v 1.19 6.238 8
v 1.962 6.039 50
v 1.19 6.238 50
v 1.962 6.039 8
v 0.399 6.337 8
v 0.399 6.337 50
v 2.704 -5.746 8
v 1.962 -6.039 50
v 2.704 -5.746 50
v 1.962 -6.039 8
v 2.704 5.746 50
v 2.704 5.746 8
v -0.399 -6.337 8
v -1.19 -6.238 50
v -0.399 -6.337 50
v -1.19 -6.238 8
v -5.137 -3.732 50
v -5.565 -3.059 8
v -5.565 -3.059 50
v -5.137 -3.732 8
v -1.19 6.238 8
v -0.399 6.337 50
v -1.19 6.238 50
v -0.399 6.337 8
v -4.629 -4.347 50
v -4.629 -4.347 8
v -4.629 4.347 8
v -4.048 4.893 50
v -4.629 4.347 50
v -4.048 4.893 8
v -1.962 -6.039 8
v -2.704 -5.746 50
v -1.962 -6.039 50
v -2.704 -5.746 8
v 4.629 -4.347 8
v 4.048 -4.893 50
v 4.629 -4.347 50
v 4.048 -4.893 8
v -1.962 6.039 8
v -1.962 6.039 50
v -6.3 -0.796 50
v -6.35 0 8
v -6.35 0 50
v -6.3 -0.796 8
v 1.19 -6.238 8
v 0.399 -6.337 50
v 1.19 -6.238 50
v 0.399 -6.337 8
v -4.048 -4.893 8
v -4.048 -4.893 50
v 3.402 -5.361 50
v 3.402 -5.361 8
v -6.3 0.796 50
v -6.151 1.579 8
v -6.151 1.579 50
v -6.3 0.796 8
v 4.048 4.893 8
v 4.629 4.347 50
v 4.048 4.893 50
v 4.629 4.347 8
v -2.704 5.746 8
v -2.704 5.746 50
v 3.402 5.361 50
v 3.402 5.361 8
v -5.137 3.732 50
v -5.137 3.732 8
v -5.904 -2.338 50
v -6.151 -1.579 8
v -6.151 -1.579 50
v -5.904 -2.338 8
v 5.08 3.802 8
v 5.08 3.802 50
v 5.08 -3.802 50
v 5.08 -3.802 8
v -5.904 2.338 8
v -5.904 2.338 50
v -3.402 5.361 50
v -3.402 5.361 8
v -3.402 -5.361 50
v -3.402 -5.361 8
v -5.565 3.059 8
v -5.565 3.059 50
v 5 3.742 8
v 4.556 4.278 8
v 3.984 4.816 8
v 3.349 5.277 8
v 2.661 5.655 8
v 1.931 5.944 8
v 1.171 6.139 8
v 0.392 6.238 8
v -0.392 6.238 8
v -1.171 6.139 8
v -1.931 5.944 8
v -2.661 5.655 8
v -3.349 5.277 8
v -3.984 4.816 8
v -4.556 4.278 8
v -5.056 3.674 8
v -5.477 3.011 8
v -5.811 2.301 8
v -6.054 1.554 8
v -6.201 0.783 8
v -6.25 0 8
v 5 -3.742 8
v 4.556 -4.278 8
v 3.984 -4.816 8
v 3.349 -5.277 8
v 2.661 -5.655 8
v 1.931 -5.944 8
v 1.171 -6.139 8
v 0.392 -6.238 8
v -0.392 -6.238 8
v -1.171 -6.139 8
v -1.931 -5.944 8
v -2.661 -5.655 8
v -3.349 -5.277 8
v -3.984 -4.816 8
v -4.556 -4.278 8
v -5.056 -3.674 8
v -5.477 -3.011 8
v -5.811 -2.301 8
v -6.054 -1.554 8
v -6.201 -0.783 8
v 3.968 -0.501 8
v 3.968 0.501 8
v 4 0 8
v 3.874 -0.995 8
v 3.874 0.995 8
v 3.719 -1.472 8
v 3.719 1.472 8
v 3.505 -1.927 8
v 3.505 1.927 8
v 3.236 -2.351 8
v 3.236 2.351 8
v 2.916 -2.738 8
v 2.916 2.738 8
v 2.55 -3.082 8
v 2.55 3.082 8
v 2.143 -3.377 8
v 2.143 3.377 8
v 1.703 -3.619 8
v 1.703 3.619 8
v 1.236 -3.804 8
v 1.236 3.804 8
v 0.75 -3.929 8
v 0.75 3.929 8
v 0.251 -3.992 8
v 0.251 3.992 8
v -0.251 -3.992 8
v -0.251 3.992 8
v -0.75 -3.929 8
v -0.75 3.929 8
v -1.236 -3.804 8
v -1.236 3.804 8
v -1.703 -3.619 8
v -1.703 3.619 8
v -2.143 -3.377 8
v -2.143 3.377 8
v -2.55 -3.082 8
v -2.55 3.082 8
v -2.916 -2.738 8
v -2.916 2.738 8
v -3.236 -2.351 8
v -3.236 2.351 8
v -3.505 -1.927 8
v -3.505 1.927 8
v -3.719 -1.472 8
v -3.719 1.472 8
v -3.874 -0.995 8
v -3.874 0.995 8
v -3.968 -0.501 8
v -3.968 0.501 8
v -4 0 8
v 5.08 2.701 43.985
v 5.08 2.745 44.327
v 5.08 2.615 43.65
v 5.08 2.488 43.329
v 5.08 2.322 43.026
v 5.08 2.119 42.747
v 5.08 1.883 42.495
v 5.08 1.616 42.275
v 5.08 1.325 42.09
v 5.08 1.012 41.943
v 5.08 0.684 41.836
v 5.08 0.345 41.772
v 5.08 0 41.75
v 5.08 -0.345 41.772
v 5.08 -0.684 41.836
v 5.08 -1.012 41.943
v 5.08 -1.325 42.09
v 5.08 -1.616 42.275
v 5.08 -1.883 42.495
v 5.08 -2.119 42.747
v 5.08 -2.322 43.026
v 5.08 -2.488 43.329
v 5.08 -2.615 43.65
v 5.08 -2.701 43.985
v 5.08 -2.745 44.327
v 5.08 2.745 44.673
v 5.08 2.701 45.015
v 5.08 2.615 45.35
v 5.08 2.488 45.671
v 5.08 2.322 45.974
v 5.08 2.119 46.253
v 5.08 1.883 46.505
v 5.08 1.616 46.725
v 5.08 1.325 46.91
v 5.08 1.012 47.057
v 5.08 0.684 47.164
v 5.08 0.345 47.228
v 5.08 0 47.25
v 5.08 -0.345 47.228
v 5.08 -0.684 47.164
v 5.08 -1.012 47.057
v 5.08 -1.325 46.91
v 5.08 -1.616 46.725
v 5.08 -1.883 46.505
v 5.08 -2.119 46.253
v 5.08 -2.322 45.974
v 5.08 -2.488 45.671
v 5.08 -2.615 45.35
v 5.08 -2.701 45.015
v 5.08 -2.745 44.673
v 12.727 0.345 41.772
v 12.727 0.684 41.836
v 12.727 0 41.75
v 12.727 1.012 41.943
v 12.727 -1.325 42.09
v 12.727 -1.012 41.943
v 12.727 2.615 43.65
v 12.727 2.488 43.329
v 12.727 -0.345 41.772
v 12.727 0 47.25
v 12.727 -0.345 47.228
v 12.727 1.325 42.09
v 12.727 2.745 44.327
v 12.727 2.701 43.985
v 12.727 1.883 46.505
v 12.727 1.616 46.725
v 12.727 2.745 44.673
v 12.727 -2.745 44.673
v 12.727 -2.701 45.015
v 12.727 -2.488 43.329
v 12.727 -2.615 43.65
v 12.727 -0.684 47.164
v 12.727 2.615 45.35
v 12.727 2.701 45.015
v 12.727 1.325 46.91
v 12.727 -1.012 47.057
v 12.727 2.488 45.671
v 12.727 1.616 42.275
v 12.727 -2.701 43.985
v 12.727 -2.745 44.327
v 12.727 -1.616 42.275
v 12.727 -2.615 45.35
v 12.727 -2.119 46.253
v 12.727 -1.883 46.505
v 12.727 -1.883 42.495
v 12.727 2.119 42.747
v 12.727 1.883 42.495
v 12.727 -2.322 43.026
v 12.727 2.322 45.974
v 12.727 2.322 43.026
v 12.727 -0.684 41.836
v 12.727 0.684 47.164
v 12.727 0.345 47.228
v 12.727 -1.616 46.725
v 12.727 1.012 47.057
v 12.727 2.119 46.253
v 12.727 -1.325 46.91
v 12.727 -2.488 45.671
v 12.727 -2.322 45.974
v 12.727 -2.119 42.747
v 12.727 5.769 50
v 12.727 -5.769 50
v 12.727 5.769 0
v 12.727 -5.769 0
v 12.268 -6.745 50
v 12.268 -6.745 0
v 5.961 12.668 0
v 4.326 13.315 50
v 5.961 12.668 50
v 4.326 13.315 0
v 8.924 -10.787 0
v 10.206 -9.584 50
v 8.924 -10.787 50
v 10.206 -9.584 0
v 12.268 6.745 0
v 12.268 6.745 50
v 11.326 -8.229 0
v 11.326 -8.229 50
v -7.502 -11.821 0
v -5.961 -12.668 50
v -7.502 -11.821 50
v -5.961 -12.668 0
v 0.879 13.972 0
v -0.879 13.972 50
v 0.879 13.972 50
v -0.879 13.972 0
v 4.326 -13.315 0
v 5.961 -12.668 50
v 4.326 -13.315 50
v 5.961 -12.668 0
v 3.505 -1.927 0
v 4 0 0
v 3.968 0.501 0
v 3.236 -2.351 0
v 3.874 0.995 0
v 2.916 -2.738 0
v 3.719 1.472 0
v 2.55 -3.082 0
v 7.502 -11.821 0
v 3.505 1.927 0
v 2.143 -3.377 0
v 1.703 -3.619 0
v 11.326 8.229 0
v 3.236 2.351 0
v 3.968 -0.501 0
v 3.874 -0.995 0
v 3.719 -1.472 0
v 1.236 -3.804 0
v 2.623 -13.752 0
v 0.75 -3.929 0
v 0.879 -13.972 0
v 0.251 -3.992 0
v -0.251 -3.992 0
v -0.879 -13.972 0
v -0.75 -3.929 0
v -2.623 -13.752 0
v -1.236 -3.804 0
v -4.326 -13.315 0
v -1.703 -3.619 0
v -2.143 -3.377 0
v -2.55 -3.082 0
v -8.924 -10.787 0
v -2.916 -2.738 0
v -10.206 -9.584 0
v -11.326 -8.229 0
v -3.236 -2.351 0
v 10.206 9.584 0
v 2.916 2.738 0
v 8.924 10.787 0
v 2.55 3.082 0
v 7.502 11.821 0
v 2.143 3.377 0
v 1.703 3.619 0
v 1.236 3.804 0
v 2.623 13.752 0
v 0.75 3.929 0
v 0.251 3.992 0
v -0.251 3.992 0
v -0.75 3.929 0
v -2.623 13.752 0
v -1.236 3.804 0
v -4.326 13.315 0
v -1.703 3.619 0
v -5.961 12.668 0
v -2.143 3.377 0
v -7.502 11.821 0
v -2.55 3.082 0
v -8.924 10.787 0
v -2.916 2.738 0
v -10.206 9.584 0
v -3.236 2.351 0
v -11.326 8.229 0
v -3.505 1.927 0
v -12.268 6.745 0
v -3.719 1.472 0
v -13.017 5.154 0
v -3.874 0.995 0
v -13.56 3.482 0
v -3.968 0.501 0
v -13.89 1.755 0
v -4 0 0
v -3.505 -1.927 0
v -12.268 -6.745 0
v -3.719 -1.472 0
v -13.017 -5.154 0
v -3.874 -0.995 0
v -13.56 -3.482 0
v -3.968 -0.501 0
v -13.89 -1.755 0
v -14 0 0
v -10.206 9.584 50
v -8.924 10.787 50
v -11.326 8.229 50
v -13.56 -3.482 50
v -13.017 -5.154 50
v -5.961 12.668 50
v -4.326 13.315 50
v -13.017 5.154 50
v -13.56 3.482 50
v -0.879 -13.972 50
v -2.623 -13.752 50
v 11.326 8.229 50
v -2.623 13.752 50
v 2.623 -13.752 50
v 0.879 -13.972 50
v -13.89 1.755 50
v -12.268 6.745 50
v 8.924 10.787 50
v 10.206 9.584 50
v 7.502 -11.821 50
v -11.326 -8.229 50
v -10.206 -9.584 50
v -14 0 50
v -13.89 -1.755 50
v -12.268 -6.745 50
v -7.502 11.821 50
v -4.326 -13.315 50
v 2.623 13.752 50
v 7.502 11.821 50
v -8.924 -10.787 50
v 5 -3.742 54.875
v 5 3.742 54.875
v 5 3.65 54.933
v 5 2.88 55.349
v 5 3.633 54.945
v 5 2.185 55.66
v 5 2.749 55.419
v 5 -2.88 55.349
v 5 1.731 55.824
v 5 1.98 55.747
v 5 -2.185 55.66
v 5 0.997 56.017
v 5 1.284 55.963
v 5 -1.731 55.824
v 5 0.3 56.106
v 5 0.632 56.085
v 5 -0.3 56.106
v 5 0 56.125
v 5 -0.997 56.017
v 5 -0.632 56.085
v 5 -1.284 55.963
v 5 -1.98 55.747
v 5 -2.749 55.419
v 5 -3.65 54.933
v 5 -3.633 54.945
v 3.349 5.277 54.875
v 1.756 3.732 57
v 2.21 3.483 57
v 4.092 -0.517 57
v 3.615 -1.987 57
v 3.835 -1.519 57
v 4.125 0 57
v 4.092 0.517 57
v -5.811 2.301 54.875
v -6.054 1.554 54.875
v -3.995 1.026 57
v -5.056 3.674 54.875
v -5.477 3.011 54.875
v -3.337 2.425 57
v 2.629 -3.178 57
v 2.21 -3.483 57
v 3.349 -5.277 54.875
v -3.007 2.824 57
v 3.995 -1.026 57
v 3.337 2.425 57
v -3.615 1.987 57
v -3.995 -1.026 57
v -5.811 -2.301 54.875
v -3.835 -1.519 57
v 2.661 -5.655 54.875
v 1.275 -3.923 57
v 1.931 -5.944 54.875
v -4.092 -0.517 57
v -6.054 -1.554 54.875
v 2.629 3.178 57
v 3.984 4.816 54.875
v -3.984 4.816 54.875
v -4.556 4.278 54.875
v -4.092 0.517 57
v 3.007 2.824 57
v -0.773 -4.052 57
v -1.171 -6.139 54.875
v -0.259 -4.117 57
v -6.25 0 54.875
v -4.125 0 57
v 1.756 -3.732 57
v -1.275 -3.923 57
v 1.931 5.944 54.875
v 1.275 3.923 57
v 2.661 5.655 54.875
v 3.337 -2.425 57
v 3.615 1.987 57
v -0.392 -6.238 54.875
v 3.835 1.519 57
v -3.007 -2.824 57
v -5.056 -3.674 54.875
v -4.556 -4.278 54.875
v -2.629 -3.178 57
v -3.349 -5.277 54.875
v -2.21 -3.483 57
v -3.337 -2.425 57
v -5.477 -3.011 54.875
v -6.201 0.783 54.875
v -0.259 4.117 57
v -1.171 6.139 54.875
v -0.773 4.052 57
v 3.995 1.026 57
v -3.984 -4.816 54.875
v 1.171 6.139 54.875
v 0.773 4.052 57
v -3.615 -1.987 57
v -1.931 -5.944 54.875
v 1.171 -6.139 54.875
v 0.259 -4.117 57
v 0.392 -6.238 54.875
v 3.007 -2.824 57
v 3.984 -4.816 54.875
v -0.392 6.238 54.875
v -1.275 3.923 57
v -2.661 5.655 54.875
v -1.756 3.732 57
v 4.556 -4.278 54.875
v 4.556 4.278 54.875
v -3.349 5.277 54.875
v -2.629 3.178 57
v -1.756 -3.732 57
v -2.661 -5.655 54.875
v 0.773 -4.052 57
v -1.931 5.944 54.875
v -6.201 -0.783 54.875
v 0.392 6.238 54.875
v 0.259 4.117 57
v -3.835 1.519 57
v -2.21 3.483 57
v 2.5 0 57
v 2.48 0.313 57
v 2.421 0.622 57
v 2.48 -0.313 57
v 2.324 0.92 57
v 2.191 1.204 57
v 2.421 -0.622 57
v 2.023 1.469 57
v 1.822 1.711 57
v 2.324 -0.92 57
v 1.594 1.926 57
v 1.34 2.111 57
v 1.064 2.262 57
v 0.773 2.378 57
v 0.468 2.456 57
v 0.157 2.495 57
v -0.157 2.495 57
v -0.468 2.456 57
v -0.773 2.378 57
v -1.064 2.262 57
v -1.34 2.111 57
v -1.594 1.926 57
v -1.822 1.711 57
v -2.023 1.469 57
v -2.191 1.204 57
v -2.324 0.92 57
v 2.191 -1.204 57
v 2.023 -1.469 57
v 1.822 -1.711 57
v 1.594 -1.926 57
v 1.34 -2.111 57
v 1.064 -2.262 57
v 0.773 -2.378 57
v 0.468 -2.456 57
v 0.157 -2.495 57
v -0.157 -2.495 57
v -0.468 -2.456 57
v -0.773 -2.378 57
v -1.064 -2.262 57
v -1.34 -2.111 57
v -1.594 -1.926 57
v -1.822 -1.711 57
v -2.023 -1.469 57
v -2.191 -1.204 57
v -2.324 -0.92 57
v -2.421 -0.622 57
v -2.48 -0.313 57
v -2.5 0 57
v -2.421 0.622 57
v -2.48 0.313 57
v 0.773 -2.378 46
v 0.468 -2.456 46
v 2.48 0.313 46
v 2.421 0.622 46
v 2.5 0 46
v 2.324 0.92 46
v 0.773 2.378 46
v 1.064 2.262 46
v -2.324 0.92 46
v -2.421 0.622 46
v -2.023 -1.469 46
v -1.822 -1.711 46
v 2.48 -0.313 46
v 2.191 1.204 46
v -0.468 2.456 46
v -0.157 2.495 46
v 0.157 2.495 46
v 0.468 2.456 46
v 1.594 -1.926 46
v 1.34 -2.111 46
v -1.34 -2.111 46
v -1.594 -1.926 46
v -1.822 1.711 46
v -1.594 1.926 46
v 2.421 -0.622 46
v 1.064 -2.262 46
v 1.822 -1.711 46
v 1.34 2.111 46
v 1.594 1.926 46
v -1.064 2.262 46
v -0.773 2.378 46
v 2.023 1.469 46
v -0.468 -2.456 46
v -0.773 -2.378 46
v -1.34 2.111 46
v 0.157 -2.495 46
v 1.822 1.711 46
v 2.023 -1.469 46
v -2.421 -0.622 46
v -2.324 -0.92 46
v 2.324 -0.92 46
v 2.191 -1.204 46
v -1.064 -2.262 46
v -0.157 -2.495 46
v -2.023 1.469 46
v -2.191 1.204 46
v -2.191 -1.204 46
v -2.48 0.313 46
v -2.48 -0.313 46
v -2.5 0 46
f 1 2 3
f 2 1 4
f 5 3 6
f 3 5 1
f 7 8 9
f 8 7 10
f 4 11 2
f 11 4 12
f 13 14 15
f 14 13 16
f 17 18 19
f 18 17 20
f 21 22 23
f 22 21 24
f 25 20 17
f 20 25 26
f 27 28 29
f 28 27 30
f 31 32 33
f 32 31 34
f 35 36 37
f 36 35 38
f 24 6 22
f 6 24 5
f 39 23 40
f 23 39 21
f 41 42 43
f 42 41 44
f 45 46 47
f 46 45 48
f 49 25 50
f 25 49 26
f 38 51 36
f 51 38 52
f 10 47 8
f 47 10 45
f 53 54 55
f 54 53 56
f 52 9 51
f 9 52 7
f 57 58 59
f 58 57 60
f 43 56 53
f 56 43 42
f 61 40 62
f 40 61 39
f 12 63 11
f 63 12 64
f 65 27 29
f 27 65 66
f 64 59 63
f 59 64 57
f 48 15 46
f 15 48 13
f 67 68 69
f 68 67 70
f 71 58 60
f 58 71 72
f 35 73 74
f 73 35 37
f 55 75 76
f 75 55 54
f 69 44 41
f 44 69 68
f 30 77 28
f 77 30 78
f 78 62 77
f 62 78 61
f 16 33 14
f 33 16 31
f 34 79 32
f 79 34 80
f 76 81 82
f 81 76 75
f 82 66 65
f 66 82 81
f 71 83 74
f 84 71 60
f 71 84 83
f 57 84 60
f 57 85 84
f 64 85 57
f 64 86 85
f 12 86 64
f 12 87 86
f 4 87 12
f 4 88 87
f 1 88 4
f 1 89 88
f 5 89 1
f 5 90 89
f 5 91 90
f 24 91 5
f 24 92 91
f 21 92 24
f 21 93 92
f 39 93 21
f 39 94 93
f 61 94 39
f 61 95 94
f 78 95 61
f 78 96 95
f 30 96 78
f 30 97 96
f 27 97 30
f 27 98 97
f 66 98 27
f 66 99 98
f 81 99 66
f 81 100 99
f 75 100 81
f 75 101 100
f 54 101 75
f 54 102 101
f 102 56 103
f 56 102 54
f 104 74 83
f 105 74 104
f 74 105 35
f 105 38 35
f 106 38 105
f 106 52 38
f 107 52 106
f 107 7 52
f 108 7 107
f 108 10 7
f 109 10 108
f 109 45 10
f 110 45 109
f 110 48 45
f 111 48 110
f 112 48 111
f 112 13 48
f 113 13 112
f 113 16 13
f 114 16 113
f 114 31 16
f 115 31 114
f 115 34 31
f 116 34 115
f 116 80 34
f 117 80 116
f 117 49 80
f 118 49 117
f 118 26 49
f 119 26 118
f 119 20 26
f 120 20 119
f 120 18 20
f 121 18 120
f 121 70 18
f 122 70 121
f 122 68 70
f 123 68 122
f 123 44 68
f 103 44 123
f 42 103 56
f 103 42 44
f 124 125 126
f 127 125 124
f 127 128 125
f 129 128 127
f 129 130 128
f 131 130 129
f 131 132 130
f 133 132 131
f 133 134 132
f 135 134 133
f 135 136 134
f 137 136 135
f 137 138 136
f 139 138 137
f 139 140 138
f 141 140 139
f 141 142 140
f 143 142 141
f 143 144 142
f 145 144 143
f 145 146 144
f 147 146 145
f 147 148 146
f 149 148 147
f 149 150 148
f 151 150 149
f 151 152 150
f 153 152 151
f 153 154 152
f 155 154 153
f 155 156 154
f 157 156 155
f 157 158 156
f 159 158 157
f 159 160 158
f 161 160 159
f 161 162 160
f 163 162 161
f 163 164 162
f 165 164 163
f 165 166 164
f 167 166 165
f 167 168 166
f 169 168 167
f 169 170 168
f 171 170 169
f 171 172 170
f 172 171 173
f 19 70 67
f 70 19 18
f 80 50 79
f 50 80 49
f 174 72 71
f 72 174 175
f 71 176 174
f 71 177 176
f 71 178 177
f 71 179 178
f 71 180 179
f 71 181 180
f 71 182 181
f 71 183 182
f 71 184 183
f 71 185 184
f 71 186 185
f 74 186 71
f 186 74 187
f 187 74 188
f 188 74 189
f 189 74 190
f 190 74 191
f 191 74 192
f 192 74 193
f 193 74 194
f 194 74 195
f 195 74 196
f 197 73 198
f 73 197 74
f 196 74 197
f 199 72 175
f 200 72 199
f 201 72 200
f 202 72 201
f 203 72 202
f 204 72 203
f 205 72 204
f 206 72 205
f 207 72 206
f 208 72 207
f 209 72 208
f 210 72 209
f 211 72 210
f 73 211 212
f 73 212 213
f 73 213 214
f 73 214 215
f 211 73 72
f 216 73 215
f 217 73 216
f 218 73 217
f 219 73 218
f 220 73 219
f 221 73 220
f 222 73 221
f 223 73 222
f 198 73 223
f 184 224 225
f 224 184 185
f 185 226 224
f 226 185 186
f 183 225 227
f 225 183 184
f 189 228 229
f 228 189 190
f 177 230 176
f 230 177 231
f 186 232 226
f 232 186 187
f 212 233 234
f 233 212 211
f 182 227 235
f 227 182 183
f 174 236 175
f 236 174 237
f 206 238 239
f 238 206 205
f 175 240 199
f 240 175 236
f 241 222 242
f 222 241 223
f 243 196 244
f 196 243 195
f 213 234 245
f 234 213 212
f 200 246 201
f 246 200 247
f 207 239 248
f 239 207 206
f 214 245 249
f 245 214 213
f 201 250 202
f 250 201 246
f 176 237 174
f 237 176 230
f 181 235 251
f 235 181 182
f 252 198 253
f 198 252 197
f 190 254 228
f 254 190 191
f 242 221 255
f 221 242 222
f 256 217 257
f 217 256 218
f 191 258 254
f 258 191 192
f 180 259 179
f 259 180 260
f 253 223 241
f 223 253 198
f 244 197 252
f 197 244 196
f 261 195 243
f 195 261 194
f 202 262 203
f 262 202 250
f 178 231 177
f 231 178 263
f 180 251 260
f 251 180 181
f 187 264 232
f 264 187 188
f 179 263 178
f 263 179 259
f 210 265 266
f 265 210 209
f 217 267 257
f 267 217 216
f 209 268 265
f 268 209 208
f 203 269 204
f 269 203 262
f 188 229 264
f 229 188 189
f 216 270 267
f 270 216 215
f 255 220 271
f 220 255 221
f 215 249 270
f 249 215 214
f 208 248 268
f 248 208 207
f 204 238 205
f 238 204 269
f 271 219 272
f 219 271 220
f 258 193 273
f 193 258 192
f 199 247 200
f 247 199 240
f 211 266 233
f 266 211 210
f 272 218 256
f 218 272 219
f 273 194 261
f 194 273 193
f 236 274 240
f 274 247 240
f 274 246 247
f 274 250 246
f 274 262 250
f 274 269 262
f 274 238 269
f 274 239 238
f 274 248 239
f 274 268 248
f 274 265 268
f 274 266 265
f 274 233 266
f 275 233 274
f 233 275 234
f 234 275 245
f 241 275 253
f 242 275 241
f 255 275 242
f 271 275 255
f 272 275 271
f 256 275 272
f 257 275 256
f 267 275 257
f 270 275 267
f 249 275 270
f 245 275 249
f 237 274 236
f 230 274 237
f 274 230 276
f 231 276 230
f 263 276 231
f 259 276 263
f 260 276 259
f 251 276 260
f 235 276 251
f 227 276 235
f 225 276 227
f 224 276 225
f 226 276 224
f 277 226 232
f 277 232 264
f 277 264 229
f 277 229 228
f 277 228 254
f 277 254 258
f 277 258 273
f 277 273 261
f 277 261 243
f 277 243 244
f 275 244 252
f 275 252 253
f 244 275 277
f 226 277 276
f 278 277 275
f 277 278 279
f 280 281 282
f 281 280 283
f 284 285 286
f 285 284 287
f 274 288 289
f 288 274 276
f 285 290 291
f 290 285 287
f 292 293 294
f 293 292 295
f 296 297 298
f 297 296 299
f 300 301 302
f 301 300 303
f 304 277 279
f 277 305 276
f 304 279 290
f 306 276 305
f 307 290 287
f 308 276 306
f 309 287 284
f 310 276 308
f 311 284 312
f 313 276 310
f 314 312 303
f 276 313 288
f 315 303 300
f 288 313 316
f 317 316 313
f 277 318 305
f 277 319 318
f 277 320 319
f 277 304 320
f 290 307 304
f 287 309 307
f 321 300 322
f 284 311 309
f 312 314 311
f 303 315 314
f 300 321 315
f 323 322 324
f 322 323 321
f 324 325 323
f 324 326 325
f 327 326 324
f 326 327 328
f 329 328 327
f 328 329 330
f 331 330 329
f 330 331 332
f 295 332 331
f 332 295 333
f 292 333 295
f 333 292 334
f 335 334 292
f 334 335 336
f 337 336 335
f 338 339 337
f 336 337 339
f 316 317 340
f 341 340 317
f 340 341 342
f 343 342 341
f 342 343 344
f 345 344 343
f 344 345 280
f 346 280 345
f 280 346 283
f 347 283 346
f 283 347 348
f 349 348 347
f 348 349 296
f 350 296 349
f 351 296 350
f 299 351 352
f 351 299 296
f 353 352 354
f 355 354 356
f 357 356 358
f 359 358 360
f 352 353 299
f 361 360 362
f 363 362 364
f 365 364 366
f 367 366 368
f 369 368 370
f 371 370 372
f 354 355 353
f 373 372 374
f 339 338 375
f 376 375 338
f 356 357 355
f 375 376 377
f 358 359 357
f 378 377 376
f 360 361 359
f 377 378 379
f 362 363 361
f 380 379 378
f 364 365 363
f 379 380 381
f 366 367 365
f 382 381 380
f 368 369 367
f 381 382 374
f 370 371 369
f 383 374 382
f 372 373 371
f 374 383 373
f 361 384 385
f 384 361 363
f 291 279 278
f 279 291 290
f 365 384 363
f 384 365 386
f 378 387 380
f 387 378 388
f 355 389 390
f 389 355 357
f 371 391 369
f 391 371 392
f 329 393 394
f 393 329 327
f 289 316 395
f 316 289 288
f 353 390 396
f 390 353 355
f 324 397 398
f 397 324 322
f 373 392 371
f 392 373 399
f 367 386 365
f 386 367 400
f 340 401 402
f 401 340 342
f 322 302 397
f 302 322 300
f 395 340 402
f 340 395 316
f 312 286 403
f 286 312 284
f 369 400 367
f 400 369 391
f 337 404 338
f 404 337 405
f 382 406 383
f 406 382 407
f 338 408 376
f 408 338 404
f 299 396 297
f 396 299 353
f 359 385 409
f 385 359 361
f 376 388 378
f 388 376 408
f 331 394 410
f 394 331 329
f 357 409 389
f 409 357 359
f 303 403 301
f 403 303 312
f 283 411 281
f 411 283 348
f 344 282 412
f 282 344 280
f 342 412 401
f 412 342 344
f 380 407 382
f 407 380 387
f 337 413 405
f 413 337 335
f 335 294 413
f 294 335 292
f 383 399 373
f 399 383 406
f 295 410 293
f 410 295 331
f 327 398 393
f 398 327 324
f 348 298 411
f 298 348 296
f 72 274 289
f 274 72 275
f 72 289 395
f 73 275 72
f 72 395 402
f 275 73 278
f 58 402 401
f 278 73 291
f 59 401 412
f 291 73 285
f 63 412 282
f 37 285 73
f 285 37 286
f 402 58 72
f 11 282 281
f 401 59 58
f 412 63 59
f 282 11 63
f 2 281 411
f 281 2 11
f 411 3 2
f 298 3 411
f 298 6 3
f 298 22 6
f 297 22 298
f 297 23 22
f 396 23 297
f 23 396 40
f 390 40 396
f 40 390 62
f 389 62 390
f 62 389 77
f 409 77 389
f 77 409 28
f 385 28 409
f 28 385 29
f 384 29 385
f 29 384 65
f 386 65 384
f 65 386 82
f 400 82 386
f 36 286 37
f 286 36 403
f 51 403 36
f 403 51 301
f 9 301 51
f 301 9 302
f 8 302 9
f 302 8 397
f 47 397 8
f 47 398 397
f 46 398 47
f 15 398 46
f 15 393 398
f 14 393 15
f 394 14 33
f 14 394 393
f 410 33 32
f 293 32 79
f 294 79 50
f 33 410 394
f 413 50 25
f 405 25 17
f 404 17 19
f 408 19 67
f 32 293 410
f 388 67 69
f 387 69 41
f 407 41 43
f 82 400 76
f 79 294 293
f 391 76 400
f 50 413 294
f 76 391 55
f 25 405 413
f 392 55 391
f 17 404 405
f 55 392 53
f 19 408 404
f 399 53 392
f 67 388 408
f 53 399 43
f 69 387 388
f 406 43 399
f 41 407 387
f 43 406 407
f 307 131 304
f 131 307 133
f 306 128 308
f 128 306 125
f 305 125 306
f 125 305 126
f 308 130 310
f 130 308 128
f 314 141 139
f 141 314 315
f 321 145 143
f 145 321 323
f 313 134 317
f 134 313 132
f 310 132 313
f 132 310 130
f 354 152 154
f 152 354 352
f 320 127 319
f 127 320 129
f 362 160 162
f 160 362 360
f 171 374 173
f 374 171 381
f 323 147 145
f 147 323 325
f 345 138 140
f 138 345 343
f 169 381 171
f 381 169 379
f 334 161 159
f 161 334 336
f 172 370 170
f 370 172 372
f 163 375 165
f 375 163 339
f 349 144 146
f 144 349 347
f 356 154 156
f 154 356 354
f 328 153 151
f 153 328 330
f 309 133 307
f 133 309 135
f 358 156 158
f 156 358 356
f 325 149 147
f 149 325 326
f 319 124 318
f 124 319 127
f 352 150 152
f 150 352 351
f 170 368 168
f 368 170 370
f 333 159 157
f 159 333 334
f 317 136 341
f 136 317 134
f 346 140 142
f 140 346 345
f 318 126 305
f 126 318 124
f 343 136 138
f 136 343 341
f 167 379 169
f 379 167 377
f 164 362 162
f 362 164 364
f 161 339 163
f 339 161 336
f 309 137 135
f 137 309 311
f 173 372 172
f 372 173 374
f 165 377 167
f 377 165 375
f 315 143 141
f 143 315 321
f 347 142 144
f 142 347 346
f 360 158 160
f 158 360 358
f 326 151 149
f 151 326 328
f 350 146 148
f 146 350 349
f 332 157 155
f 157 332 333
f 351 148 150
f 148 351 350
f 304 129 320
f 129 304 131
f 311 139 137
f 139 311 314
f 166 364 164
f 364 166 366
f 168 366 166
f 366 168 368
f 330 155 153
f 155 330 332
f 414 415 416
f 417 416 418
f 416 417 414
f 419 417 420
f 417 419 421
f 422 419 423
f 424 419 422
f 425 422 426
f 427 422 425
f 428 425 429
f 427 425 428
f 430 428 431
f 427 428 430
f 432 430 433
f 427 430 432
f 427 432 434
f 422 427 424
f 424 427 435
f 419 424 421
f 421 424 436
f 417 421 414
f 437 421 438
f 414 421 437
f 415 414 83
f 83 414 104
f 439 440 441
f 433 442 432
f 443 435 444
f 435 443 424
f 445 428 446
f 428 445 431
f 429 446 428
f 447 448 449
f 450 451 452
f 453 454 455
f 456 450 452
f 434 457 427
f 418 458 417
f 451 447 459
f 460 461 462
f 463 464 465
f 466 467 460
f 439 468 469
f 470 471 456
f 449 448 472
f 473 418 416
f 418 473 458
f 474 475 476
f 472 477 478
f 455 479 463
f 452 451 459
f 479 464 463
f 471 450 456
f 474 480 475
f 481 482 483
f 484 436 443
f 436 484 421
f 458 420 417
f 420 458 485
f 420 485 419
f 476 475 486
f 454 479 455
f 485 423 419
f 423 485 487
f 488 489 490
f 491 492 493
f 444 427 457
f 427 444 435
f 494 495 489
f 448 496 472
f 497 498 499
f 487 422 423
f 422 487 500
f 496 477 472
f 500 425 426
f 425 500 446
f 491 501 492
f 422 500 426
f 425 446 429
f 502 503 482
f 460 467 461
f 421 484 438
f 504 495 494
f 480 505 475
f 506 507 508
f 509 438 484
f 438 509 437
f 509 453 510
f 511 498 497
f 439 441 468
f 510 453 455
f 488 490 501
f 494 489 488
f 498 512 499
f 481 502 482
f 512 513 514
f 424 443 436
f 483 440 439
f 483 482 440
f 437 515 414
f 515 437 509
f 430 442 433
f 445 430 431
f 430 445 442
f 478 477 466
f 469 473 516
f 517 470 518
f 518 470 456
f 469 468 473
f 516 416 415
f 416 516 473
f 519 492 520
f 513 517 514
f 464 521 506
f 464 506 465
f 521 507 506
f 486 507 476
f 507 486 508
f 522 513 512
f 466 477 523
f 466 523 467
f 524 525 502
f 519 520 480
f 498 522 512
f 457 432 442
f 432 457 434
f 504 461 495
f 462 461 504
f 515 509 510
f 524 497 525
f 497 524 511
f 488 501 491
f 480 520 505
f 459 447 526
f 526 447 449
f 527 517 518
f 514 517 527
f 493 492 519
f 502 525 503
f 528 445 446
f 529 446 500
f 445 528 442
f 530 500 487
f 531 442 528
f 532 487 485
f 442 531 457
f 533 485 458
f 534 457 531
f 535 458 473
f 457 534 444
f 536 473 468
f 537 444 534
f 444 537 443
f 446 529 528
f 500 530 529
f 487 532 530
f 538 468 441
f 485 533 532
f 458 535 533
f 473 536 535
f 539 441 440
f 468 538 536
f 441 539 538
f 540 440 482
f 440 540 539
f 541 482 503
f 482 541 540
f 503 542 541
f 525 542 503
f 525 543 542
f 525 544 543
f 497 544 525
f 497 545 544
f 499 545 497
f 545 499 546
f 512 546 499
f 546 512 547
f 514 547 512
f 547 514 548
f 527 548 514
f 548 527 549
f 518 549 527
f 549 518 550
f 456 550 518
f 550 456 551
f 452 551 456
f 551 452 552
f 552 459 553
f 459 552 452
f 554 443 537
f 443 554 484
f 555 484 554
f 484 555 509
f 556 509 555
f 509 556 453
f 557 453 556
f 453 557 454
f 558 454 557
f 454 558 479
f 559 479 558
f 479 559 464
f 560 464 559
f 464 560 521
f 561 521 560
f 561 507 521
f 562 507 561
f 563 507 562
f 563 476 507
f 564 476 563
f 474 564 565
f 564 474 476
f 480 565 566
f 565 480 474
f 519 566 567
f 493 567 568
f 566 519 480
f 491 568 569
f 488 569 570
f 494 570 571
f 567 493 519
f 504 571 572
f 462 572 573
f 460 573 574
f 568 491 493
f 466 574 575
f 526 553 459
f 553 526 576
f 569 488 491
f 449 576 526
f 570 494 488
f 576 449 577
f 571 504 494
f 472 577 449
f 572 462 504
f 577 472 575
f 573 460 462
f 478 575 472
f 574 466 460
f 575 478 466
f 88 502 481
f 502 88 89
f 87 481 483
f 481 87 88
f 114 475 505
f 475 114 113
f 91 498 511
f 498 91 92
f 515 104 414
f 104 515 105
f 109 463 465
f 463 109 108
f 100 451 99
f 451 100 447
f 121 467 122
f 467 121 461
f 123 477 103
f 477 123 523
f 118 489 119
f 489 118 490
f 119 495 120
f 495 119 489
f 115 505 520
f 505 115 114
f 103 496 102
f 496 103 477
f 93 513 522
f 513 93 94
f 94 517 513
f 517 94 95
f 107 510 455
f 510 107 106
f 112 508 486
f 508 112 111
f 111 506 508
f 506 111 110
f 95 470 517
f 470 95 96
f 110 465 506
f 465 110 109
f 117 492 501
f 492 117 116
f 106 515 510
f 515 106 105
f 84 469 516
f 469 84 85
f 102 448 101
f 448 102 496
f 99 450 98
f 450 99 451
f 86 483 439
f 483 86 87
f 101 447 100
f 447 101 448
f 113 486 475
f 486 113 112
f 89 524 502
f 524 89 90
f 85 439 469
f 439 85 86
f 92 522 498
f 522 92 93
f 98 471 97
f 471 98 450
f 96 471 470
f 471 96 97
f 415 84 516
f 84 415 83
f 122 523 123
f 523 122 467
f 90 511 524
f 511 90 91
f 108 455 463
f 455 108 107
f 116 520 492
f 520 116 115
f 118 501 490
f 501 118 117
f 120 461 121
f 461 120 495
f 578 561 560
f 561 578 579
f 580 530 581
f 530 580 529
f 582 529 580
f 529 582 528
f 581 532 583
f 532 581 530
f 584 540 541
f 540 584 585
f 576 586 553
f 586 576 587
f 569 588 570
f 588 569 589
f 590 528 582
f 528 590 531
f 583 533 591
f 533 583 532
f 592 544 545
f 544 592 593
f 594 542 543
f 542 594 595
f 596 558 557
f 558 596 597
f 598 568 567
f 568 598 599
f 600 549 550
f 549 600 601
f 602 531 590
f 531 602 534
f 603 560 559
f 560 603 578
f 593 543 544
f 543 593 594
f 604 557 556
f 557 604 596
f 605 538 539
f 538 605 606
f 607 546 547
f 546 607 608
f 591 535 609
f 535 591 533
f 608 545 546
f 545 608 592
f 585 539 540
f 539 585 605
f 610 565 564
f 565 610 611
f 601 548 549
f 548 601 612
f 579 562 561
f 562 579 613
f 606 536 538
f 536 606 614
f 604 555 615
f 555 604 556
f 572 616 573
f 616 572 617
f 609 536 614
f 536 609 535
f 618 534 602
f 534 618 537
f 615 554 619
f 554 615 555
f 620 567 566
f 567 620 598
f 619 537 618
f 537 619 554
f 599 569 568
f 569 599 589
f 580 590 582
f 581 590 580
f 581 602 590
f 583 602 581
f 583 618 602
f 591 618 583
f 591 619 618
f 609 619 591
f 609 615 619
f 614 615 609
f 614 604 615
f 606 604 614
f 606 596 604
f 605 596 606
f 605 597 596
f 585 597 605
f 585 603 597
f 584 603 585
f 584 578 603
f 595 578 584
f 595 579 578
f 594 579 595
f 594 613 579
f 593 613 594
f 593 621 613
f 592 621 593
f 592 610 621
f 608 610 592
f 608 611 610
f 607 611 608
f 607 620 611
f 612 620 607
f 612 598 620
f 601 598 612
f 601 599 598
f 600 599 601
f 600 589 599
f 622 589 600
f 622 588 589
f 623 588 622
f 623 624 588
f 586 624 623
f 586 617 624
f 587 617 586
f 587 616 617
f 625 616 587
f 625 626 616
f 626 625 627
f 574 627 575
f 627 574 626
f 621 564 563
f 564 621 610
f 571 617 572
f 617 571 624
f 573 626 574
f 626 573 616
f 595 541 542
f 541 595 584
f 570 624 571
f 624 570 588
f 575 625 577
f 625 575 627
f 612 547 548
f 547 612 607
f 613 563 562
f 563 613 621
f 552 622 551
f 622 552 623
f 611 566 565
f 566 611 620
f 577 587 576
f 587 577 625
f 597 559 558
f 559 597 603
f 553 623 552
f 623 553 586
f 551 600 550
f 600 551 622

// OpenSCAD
//A Optics Post mount, loosely based on the conventional post in tube style seen in most optical systems.
//Author TEM01*

$fn = 50;

/*[General Parameters]*/
//Generate the "Post", the "Socket", or "Both" components.
generate = "Both";
//Clearance is used for fillets and clearance between moving parts. It is intended to be 1mm.
clearance = 1;
//Tolerance is used for printer tolerancing for snug fit parts
tolerance = 0.1;

/*[Hardware Parameters]*/
//Top post connection type "Heatset" or "Threaded" Threaded not implemented yet
top_thread = "Heatset";
//Top post heatset diameter
top_hsert_dia = 5;
//Top post heatset depth
top_hsert_depth = 12;

//Bottom Socket connection type "Heatset" or "Threaded" Threaded not implemented yet
bot_thread = "Heatset";
//Bottom post heatset diameter
bot_hsert_dia = 8;
//Bottom post heatset depth
bot_hsert_depth = 8;

//Post Height
post_height = 50;
//Post Diameter
post_dia = 12.5;

//Socket Height
socket_height = 50;
//Socket Outer Diameter
socket_dia = 28;

//Key type. Currently only "Flat" or "None"
key = "Flat";

//Fixing Bolt Hole Diameter
fix_hole = 5.5;

if(generate == "Post"){Post();}
else if(generate == "Socket"){Socket();}
else if(generate == "Both"){
    translate([0,0,0]){
        Socket();
    }
    translate([0,0,bot_hsert_dia]){
        Post();
    }
}

module Post(){
    difference(){
        union(){
            intersection(){
                PostOrSocketHole(post_height,post_dia);
                translate([0,0,post_height-post_dia/4]){
                    cylinder(h = post_dia/4-clearance, d1 = post_dia, d2 = post_dia-post_dia/2+2*clearance);
                }
            }
            PostOrSocketHole(post_height-post_dia/4,post_dia);
        };
        translate([0,0,post_height-top_hsert_depth]){
            cylinder(top_hsert_depth,d=top_hsert_dia);
        }
    }
}

module Socket(){
    difference(){
        cylinder(socket_height, d = socket_dia);
        translate([0,0,bot_hsert_dia]){
            PostOrSocketHole(post_height,post_dia+2*tolerance);
        }
        cylinder(bot_hsert_depth, d = bot_hsert_dia);
        translate([0,0,socket_height-fix_hole]){
            rotate([0,90,0]){
                cylinder(socket_dia, d = fix_hole);
                translate([0,0,socket_dia/2.2]){
                    cylinder(socket_dia, d = 2*socket_height);
                }
            }
        }
    }
}

module PostOrSocketHole(height, diameter){
    difference(){
        cylinder(height, d = diameter);
        if(key == "Flat"){
            translate([0.4*diameter,-0.5*diameter,0]){ //flat is 90% of the circle
                cube([diameter,diameter,height]);
            }
        }
    }
}
